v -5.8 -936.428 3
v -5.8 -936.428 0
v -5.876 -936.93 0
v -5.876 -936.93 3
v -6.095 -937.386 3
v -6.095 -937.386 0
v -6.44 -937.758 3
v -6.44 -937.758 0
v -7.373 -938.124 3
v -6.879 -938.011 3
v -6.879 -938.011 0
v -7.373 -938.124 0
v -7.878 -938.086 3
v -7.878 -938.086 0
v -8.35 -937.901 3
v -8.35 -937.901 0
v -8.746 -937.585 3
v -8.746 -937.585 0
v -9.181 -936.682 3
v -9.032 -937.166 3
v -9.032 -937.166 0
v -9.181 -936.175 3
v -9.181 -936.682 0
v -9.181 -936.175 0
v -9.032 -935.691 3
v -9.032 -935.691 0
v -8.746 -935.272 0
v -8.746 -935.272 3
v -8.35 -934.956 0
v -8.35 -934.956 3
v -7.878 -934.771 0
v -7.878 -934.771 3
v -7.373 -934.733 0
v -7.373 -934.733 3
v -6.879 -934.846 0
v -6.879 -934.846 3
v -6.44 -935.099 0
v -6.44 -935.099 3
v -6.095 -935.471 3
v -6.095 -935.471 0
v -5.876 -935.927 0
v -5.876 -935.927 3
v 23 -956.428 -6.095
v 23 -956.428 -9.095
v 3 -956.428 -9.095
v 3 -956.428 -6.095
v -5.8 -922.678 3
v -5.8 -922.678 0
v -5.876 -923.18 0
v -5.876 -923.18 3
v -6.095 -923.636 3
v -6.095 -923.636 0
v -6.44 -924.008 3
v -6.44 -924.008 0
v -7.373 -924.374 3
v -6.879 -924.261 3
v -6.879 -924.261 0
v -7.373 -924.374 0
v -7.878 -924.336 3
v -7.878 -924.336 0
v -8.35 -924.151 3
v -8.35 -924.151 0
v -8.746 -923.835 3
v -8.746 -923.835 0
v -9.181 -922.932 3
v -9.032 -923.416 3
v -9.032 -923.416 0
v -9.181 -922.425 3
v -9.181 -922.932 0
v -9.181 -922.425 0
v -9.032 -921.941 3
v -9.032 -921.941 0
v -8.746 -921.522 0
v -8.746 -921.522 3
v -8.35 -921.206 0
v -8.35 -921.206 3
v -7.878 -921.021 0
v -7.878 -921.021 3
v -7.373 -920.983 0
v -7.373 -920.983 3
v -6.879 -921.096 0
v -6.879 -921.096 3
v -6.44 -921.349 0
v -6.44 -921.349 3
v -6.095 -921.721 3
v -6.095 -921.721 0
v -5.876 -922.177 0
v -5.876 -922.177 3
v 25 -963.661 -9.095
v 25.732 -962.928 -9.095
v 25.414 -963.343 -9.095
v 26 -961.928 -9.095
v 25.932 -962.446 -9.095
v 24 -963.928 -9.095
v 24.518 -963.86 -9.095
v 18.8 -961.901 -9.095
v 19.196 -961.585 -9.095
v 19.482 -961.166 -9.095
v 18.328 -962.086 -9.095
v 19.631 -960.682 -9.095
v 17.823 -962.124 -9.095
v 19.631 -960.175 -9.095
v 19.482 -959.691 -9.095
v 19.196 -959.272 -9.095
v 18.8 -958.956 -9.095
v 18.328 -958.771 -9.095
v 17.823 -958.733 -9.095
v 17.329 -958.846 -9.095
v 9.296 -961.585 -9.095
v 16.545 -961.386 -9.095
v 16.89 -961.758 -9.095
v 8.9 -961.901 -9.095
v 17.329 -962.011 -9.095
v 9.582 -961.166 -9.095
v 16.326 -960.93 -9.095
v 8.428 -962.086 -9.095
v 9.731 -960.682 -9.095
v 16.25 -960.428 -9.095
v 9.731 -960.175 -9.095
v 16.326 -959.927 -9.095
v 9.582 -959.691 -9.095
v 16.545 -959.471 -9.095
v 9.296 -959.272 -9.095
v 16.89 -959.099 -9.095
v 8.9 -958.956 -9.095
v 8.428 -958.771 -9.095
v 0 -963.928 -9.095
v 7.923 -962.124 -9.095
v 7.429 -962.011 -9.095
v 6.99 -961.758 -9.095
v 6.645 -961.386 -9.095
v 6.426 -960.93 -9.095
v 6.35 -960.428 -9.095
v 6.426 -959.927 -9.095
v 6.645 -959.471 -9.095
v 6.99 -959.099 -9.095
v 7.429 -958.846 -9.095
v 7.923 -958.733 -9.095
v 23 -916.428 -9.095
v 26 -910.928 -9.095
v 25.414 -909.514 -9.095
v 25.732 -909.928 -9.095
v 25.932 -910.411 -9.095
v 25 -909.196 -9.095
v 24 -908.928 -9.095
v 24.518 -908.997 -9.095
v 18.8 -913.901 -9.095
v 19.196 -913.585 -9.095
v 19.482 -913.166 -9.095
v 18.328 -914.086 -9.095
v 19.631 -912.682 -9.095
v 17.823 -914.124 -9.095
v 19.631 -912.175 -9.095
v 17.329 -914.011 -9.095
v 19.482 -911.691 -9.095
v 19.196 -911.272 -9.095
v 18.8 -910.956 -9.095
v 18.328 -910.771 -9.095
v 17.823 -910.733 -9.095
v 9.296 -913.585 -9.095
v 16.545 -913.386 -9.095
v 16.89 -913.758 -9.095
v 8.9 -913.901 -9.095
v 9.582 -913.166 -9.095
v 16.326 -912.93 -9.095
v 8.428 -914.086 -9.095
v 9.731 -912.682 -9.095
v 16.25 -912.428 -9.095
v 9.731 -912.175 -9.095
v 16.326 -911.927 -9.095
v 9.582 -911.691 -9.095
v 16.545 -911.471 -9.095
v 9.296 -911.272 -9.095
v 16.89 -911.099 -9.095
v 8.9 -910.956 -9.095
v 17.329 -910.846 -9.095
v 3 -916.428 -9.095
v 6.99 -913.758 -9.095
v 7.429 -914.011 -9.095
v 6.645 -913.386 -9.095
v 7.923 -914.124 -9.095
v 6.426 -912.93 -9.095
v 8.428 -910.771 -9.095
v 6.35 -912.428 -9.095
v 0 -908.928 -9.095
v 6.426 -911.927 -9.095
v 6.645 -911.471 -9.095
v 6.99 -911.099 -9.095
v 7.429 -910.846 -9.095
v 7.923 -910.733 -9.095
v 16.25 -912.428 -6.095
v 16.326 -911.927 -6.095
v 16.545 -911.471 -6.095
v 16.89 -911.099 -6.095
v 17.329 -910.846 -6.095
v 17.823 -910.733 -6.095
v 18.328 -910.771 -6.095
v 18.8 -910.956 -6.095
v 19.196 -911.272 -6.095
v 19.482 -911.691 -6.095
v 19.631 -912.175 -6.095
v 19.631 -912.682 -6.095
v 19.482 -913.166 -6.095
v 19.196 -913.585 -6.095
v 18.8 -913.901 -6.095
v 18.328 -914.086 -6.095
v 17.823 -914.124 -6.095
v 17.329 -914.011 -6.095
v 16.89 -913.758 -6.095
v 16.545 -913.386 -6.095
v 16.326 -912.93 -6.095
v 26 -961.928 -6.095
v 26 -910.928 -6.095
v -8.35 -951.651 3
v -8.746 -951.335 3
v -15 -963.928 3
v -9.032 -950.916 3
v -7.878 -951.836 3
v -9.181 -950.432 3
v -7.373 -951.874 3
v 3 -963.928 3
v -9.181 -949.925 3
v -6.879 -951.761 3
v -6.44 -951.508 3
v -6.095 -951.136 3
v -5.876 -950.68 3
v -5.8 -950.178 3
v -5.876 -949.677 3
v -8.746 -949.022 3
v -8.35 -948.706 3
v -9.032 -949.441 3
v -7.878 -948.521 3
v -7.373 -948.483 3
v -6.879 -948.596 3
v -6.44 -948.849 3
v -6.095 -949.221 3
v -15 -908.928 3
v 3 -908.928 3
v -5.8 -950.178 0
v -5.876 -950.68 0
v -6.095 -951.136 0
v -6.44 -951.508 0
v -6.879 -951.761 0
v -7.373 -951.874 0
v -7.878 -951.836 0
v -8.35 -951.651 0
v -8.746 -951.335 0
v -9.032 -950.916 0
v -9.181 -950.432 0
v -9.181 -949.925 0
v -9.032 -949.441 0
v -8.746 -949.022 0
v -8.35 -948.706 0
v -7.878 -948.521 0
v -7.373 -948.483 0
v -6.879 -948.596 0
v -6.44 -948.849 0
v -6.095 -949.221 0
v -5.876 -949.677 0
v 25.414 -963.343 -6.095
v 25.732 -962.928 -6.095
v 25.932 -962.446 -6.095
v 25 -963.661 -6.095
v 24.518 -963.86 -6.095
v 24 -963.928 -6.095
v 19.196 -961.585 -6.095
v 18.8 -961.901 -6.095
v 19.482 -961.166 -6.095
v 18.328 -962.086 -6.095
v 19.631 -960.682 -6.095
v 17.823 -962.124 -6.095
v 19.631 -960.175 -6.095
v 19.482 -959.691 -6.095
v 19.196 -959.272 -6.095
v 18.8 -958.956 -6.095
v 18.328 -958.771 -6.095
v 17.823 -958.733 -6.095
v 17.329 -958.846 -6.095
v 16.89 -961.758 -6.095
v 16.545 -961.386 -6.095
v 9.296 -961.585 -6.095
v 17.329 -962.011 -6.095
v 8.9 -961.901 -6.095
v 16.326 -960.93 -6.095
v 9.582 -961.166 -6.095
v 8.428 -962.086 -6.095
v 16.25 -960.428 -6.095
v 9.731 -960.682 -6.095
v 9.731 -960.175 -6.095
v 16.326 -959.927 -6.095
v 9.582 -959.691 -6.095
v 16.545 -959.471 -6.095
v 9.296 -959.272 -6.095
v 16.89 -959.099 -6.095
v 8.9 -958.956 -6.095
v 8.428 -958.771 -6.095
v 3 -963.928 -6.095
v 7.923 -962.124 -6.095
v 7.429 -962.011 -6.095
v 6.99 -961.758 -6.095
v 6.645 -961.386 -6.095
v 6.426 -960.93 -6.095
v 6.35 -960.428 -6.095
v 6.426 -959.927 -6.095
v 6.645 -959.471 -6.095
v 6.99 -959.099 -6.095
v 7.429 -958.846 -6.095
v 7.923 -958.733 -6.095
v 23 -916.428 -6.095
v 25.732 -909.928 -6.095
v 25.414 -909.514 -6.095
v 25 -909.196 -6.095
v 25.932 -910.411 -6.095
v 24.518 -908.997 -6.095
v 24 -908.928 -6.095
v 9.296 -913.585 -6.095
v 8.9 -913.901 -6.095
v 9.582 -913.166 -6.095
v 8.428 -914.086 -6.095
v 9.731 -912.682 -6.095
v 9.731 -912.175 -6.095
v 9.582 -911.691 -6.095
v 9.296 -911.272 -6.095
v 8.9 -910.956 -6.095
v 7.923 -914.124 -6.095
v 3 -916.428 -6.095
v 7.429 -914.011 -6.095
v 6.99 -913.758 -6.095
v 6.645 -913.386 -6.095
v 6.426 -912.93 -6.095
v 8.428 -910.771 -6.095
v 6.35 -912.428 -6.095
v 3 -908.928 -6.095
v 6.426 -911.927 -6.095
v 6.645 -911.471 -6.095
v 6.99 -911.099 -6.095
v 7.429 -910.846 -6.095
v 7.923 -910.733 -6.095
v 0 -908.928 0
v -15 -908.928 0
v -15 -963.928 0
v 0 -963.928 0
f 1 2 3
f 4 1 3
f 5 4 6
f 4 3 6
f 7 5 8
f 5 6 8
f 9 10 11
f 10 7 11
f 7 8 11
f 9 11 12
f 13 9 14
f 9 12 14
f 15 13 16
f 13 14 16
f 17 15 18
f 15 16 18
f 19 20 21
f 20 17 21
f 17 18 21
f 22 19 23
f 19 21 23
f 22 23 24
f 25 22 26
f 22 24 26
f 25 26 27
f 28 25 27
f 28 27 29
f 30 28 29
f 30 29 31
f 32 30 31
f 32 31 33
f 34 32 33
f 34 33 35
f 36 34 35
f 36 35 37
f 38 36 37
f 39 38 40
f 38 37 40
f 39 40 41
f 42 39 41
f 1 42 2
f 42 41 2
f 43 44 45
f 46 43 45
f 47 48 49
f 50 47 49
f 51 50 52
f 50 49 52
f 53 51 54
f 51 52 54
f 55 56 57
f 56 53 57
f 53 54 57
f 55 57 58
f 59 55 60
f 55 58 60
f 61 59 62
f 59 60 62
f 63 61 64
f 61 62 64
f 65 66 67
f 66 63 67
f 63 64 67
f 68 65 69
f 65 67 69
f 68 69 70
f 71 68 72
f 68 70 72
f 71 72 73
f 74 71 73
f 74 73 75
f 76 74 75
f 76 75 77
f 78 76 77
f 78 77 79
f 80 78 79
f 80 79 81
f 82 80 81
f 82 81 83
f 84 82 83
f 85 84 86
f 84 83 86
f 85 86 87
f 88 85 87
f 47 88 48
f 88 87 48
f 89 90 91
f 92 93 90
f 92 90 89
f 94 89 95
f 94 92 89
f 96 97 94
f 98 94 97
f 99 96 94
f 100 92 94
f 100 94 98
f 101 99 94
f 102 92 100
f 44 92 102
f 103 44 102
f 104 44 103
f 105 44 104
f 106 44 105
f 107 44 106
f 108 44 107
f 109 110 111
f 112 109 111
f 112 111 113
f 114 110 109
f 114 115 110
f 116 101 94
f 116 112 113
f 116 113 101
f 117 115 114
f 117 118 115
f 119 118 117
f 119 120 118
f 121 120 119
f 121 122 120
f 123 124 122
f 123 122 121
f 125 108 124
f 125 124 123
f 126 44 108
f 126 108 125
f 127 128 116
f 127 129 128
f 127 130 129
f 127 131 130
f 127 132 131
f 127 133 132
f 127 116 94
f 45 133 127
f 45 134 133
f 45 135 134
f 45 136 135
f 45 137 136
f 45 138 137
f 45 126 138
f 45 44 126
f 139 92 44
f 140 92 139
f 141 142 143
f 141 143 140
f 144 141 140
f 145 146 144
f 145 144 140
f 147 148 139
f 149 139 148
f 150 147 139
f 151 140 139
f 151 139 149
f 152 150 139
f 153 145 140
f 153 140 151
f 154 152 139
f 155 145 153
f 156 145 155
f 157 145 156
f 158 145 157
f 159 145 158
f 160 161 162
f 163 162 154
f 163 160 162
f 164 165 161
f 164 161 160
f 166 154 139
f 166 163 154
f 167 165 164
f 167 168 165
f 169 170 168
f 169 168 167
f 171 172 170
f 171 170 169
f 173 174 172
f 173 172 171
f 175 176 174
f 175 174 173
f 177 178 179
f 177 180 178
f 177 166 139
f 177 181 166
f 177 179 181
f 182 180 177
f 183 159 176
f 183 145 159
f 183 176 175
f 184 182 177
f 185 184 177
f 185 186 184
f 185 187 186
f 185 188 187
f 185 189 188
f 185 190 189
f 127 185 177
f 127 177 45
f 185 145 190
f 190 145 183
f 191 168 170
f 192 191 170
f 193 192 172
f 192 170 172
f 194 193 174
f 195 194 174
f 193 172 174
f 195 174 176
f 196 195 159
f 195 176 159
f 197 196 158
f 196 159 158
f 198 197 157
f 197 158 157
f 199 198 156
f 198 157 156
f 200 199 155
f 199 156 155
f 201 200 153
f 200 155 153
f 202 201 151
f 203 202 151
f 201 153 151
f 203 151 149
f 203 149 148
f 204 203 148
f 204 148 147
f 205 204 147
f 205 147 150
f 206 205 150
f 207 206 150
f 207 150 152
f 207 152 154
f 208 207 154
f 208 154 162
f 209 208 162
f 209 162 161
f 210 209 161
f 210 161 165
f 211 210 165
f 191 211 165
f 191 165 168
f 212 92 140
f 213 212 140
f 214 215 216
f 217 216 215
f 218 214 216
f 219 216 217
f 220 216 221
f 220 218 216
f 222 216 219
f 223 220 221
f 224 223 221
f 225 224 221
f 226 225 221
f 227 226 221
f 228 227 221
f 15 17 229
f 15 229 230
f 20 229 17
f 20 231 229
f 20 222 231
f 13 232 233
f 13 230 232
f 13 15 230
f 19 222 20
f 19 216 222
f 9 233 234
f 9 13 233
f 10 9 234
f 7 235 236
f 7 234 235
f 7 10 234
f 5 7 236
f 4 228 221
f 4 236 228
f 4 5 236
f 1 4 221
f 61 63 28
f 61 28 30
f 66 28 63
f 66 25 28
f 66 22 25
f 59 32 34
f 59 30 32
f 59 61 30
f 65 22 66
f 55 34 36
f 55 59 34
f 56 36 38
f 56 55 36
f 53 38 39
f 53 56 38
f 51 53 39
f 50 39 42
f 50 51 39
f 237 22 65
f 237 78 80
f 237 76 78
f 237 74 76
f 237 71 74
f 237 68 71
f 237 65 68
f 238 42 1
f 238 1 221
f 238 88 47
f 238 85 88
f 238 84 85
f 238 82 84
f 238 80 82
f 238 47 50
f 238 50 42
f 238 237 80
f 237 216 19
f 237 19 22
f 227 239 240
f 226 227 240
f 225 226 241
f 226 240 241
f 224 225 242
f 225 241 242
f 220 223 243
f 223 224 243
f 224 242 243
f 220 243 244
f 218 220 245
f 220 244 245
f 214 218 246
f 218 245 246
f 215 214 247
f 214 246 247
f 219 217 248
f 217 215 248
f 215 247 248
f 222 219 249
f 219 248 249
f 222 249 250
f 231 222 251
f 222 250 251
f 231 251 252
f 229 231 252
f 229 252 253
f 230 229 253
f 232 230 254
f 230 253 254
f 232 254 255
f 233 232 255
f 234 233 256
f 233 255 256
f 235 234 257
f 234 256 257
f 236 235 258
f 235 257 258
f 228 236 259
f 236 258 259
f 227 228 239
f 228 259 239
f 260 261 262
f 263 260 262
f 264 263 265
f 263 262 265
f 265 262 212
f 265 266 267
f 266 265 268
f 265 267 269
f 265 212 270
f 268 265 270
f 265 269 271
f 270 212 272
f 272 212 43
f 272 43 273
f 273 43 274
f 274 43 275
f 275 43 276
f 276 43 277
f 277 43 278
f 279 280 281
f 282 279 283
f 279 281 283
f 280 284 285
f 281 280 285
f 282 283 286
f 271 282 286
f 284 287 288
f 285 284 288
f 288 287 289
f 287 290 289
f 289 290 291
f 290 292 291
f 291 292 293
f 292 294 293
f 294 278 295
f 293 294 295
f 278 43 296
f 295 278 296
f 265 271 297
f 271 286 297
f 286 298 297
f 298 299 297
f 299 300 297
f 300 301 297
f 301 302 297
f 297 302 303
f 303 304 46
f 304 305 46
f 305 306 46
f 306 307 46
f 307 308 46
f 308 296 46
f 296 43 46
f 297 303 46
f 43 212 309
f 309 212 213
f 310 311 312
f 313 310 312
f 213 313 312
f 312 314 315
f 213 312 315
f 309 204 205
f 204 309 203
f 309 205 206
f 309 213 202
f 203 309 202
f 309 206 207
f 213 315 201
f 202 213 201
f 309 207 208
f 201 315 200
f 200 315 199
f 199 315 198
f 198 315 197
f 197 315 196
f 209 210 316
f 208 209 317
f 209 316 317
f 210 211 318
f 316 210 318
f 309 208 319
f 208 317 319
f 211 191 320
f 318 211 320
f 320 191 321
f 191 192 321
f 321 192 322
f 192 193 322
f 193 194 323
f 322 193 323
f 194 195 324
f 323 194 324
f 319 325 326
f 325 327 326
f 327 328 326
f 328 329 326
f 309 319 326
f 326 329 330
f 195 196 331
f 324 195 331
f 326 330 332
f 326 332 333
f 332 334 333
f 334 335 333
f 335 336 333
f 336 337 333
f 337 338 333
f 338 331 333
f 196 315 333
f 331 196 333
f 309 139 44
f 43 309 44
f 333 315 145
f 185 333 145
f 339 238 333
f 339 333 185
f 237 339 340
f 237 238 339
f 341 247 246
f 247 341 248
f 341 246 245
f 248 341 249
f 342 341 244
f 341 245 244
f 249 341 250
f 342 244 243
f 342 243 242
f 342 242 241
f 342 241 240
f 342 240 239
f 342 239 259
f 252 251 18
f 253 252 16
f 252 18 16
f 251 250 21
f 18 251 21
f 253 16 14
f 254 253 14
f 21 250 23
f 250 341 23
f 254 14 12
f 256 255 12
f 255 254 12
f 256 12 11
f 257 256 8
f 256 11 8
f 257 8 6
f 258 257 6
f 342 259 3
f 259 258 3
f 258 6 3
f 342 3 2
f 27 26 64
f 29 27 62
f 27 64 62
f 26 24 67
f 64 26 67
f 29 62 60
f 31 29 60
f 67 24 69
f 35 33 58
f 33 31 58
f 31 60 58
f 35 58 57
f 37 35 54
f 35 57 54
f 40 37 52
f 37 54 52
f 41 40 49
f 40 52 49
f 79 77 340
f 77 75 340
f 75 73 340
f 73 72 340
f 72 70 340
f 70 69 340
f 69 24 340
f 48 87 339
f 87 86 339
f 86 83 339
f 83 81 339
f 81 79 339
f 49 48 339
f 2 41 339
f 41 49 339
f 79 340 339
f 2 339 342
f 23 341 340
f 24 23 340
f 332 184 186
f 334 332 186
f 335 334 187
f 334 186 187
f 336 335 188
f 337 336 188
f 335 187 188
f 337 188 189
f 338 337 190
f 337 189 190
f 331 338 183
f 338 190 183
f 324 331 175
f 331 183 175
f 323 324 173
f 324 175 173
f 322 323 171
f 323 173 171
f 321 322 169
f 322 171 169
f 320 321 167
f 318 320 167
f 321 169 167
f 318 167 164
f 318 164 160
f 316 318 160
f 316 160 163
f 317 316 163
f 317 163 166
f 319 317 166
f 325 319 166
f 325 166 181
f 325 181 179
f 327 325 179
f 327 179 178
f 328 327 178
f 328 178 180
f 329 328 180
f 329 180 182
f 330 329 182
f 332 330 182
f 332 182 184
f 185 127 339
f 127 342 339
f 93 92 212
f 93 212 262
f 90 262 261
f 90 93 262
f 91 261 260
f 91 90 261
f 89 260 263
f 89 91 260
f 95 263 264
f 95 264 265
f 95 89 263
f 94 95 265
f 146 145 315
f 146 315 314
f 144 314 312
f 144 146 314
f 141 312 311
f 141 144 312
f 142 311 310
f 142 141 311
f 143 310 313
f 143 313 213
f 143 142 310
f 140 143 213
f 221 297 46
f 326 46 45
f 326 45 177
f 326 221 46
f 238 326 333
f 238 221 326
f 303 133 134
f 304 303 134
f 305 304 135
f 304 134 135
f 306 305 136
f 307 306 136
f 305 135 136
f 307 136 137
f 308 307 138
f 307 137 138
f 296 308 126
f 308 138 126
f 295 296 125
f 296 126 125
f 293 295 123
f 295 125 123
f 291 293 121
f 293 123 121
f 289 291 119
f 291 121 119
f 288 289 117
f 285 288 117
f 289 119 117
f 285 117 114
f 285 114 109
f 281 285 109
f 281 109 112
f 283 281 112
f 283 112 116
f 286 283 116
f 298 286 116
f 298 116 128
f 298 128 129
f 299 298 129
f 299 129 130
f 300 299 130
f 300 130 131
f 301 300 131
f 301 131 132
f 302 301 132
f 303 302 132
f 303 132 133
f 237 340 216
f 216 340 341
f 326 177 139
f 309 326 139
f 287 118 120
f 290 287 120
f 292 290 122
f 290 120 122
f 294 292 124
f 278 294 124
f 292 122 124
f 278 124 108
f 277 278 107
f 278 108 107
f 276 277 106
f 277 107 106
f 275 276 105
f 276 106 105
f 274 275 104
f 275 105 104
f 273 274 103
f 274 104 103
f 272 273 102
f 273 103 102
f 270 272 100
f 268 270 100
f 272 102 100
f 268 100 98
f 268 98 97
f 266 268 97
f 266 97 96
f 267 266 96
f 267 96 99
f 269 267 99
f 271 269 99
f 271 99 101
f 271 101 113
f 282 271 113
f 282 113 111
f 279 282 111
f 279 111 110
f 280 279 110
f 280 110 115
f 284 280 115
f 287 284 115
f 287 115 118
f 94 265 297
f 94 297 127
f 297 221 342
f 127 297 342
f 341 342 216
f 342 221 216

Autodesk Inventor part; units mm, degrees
ref_plane "YZ Plane" through (0, 0, 0) normal (1, 0, 0) x (0, 1, 0)
ref_plane "XZ Plane" through (0, 0, 0) normal (0, 1, 0) x (-1, 0, 0)
sketch "Sketch1" plane through (0, 0, 0) normal (0, 0, 1) x (1, 0, 0)
  line L0 (0, -1000) -> (0, -848) construction
  line L1 (-15, -848) -> (-15, -1000) construction
  line L2 (-15, -963.9285) -> (0, -963.9285)
  line L3 (0, -963.9285) -> (0, -908.9285)
  line L4 (0, -908.9285) -> (-15, -908.9285)
  line L5 (-15, -908.9285) -> (-15, -963.9285)
  line L6 (0, -963.9285) -> (3, -963.9285)
  line L7 (3, -963.9285) -> (3, -908.9285)
  line L8 (3, -908.9285) -> (0, -908.9285)
  line L9 (0, -908.9285) -> (0, -963.9285)
  line L10 (-7.5, -908.9285) -> (-7.5, -963.9285) construction
  circle A0 centre (-7.5, -922.6785) radius 1.7
  circle A1 centre (-7.5, -936.4285) radius 1.7
  circle A2 centre (-7.5, -950.1785) radius 1.7
  line L11 (-15, -936.4285) -> (3, -936.4285) construction
  point P0 (0, 0)
  dimension "d6" = 55
  dimension "d7" = 3
  dimension "d22" = 3.4
  dimension "d23" = 3.4
  dimension "d24" = 3.4
  dimension "d25" = 13.75
  dimension "d26" = 13.75
extrude "Extrusion1" add sketch "Sketch1" along normal blind 3
sketch "Sketch2" plane through (0, 0, 0) normal (0, 0, -1) x (-1, 0, 0)
  line L0 (-3, -963.9285) -> (-3, -908.9285) projected
  line L1 (-3, -908.9285) -> (15, -908.9285) projected
  line L2 (-3, -963.9285) -> (0, -963.9285)
  line L3 (0, -963.9285) -> (0, -908.9285)
  line L4 (0, -908.9285) -> (-3, -908.9285)
  line L5 (-3, -908.9285) -> (-3, -963.9285)
  point P0 (0, 0)
ref_plane "Work Plane1" through (54.1997, -954.1849, -9.0948) normal (0, 0, 1) x (0.9638, -0.2666, 0)
extrude "Extrusion2" add sketch "Sketch2" along normal up to surface (9.0948 mm away)
sketch "Sketch3" plane through (3, -963.9285, -9.0948) normal (0, 0, -1) x (-1, 0, 0)
  line L0 (0, 0) -> (0, 55) projected
  line L1 (0, 27.5) -> (-10, 27.5) construction
  line L2 (-20, 7.5) -> (0, 7.5)
  line L3 (0, 7.5) -> (0, 47.5)
  line L4 (0, 47.5) -> (-20, 47.5)
  line L5 (-20, 47.5) -> (-20, 7.5)
  line L6 (-20, 7.5) -> (0, 47.5) construction
  line L7 (0, 7.5) -> (-20, 47.5) construction
  line L8 (-14.95, 3.5) -> (-5.05, 3.5) construction
  line L9 (-5.05, 3.5) -> (-5.05, 51.5) construction
  line L10 (-5.05, 51.5) -> (-14.95, 51.5) construction
  line L11 (-14.95, 51.5) -> (-14.95, 3.5) construction
  line L12 (-14.95, 3.5) -> (-5.05, 51.5) construction
  line L13 (-5.05, 3.5) -> (-14.95, 51.5) construction
  circle A0 centre (-14.95, 3.5) radius 1.7
  line L14 (-10, 3.5) -> (-10, 51.5) construction
  circle A1 centre (-14.95, 51.5) radius 1.7
  circle A2 centre (-5.05, 3.5) radius 1.7
  circle A3 centre (-5.05, 51.5) radius 1.7
  line L15 (3, 0) -> (-21, 0)
  line L16 (-23, 2) -> (-23, 53)
  line L17 (-21, 55) -> (3, 55)
  line L18 (3, 55) -> (3, 0)
  line L19 (3, 0) -> (-23, 55) construction
  line L20 (-23, 0) -> (3, 55) construction
  arc A4 (-23, 2) -> (-21, 0) centre (-21, 2) ccw
  arc A5 (-21, 55) -> (-23, 53) centre (-21, 53) ccw
  point P0 (3, 963.9285)
  point P1 (0, 7.5)
  dimension "d12" = 10
  dimension "d13" = 40
  dimension "d14" = 9.9
  dimension "d15" = 48
  dimension "d16" = 3.4
  dimension "d17" = 26
  dimension "d18" = 55
  dimension "d19" = 2
extrude "Extrusion3" add sketch "Sketch3" against normal blind 3 contours L15 A4 L16 A5 L17 L0 L4 L5 L2 | L0 L17 L18 L15
properties part number "ServoMount"
